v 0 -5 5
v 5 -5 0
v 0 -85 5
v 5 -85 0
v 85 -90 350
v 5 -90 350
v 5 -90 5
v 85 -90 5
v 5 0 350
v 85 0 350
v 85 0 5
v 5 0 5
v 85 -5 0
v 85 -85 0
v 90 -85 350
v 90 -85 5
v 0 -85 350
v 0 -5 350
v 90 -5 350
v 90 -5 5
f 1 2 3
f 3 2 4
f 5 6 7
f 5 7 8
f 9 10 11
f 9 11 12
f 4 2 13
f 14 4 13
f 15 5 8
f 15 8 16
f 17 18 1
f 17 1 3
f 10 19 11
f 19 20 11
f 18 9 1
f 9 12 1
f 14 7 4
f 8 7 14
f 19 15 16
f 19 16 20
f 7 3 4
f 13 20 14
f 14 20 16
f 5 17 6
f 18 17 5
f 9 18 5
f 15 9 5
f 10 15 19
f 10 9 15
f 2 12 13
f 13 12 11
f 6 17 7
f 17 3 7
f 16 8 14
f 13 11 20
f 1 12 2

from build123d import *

# Parameters (mm, degrees)
F0_W     = 90
F0_H     = 300
F1_DEPTH = 90
F2_SIZE  = 5
F3_DEPTH = 50


with BuildPart() as f1:
    # F0 (on Front) → F1 (new body)
    with BuildSketch(Plane.XZ):
        with Locations((45, 150)):
            Rectangle(F0_W, F0_H)
    extrude(amount=F1_DEPTH)

    # F2
    f2_edges = [f1.edges().sort_by_distance(p)[0] for p in [
        (90, -90, 150),
        (0, -90, 150),
        (90, 0, 150),
        (0, 0, 150),
        (45, 0, 0),
        (0, -45, 0),
        (45, -90, 0),
        (90, -45, 0),
    ]]
    chamfer(f2_edges, length=F2_SIZE)

    # F1_face (on face) → F3 (join)
    with BuildSketch(Plane(origin=(45, -45, 300), x_dir=(1, 0, 0), z_dir=(0, 0, 1))):
        Polygon((45, -40), (45, 40), (40, 45), (-40, 45), (-45, 40), (-45, -40), (-40, -45), (40, -45), align=None)
    extrude(amount=F3_DEPTH)


solid = f1.part
